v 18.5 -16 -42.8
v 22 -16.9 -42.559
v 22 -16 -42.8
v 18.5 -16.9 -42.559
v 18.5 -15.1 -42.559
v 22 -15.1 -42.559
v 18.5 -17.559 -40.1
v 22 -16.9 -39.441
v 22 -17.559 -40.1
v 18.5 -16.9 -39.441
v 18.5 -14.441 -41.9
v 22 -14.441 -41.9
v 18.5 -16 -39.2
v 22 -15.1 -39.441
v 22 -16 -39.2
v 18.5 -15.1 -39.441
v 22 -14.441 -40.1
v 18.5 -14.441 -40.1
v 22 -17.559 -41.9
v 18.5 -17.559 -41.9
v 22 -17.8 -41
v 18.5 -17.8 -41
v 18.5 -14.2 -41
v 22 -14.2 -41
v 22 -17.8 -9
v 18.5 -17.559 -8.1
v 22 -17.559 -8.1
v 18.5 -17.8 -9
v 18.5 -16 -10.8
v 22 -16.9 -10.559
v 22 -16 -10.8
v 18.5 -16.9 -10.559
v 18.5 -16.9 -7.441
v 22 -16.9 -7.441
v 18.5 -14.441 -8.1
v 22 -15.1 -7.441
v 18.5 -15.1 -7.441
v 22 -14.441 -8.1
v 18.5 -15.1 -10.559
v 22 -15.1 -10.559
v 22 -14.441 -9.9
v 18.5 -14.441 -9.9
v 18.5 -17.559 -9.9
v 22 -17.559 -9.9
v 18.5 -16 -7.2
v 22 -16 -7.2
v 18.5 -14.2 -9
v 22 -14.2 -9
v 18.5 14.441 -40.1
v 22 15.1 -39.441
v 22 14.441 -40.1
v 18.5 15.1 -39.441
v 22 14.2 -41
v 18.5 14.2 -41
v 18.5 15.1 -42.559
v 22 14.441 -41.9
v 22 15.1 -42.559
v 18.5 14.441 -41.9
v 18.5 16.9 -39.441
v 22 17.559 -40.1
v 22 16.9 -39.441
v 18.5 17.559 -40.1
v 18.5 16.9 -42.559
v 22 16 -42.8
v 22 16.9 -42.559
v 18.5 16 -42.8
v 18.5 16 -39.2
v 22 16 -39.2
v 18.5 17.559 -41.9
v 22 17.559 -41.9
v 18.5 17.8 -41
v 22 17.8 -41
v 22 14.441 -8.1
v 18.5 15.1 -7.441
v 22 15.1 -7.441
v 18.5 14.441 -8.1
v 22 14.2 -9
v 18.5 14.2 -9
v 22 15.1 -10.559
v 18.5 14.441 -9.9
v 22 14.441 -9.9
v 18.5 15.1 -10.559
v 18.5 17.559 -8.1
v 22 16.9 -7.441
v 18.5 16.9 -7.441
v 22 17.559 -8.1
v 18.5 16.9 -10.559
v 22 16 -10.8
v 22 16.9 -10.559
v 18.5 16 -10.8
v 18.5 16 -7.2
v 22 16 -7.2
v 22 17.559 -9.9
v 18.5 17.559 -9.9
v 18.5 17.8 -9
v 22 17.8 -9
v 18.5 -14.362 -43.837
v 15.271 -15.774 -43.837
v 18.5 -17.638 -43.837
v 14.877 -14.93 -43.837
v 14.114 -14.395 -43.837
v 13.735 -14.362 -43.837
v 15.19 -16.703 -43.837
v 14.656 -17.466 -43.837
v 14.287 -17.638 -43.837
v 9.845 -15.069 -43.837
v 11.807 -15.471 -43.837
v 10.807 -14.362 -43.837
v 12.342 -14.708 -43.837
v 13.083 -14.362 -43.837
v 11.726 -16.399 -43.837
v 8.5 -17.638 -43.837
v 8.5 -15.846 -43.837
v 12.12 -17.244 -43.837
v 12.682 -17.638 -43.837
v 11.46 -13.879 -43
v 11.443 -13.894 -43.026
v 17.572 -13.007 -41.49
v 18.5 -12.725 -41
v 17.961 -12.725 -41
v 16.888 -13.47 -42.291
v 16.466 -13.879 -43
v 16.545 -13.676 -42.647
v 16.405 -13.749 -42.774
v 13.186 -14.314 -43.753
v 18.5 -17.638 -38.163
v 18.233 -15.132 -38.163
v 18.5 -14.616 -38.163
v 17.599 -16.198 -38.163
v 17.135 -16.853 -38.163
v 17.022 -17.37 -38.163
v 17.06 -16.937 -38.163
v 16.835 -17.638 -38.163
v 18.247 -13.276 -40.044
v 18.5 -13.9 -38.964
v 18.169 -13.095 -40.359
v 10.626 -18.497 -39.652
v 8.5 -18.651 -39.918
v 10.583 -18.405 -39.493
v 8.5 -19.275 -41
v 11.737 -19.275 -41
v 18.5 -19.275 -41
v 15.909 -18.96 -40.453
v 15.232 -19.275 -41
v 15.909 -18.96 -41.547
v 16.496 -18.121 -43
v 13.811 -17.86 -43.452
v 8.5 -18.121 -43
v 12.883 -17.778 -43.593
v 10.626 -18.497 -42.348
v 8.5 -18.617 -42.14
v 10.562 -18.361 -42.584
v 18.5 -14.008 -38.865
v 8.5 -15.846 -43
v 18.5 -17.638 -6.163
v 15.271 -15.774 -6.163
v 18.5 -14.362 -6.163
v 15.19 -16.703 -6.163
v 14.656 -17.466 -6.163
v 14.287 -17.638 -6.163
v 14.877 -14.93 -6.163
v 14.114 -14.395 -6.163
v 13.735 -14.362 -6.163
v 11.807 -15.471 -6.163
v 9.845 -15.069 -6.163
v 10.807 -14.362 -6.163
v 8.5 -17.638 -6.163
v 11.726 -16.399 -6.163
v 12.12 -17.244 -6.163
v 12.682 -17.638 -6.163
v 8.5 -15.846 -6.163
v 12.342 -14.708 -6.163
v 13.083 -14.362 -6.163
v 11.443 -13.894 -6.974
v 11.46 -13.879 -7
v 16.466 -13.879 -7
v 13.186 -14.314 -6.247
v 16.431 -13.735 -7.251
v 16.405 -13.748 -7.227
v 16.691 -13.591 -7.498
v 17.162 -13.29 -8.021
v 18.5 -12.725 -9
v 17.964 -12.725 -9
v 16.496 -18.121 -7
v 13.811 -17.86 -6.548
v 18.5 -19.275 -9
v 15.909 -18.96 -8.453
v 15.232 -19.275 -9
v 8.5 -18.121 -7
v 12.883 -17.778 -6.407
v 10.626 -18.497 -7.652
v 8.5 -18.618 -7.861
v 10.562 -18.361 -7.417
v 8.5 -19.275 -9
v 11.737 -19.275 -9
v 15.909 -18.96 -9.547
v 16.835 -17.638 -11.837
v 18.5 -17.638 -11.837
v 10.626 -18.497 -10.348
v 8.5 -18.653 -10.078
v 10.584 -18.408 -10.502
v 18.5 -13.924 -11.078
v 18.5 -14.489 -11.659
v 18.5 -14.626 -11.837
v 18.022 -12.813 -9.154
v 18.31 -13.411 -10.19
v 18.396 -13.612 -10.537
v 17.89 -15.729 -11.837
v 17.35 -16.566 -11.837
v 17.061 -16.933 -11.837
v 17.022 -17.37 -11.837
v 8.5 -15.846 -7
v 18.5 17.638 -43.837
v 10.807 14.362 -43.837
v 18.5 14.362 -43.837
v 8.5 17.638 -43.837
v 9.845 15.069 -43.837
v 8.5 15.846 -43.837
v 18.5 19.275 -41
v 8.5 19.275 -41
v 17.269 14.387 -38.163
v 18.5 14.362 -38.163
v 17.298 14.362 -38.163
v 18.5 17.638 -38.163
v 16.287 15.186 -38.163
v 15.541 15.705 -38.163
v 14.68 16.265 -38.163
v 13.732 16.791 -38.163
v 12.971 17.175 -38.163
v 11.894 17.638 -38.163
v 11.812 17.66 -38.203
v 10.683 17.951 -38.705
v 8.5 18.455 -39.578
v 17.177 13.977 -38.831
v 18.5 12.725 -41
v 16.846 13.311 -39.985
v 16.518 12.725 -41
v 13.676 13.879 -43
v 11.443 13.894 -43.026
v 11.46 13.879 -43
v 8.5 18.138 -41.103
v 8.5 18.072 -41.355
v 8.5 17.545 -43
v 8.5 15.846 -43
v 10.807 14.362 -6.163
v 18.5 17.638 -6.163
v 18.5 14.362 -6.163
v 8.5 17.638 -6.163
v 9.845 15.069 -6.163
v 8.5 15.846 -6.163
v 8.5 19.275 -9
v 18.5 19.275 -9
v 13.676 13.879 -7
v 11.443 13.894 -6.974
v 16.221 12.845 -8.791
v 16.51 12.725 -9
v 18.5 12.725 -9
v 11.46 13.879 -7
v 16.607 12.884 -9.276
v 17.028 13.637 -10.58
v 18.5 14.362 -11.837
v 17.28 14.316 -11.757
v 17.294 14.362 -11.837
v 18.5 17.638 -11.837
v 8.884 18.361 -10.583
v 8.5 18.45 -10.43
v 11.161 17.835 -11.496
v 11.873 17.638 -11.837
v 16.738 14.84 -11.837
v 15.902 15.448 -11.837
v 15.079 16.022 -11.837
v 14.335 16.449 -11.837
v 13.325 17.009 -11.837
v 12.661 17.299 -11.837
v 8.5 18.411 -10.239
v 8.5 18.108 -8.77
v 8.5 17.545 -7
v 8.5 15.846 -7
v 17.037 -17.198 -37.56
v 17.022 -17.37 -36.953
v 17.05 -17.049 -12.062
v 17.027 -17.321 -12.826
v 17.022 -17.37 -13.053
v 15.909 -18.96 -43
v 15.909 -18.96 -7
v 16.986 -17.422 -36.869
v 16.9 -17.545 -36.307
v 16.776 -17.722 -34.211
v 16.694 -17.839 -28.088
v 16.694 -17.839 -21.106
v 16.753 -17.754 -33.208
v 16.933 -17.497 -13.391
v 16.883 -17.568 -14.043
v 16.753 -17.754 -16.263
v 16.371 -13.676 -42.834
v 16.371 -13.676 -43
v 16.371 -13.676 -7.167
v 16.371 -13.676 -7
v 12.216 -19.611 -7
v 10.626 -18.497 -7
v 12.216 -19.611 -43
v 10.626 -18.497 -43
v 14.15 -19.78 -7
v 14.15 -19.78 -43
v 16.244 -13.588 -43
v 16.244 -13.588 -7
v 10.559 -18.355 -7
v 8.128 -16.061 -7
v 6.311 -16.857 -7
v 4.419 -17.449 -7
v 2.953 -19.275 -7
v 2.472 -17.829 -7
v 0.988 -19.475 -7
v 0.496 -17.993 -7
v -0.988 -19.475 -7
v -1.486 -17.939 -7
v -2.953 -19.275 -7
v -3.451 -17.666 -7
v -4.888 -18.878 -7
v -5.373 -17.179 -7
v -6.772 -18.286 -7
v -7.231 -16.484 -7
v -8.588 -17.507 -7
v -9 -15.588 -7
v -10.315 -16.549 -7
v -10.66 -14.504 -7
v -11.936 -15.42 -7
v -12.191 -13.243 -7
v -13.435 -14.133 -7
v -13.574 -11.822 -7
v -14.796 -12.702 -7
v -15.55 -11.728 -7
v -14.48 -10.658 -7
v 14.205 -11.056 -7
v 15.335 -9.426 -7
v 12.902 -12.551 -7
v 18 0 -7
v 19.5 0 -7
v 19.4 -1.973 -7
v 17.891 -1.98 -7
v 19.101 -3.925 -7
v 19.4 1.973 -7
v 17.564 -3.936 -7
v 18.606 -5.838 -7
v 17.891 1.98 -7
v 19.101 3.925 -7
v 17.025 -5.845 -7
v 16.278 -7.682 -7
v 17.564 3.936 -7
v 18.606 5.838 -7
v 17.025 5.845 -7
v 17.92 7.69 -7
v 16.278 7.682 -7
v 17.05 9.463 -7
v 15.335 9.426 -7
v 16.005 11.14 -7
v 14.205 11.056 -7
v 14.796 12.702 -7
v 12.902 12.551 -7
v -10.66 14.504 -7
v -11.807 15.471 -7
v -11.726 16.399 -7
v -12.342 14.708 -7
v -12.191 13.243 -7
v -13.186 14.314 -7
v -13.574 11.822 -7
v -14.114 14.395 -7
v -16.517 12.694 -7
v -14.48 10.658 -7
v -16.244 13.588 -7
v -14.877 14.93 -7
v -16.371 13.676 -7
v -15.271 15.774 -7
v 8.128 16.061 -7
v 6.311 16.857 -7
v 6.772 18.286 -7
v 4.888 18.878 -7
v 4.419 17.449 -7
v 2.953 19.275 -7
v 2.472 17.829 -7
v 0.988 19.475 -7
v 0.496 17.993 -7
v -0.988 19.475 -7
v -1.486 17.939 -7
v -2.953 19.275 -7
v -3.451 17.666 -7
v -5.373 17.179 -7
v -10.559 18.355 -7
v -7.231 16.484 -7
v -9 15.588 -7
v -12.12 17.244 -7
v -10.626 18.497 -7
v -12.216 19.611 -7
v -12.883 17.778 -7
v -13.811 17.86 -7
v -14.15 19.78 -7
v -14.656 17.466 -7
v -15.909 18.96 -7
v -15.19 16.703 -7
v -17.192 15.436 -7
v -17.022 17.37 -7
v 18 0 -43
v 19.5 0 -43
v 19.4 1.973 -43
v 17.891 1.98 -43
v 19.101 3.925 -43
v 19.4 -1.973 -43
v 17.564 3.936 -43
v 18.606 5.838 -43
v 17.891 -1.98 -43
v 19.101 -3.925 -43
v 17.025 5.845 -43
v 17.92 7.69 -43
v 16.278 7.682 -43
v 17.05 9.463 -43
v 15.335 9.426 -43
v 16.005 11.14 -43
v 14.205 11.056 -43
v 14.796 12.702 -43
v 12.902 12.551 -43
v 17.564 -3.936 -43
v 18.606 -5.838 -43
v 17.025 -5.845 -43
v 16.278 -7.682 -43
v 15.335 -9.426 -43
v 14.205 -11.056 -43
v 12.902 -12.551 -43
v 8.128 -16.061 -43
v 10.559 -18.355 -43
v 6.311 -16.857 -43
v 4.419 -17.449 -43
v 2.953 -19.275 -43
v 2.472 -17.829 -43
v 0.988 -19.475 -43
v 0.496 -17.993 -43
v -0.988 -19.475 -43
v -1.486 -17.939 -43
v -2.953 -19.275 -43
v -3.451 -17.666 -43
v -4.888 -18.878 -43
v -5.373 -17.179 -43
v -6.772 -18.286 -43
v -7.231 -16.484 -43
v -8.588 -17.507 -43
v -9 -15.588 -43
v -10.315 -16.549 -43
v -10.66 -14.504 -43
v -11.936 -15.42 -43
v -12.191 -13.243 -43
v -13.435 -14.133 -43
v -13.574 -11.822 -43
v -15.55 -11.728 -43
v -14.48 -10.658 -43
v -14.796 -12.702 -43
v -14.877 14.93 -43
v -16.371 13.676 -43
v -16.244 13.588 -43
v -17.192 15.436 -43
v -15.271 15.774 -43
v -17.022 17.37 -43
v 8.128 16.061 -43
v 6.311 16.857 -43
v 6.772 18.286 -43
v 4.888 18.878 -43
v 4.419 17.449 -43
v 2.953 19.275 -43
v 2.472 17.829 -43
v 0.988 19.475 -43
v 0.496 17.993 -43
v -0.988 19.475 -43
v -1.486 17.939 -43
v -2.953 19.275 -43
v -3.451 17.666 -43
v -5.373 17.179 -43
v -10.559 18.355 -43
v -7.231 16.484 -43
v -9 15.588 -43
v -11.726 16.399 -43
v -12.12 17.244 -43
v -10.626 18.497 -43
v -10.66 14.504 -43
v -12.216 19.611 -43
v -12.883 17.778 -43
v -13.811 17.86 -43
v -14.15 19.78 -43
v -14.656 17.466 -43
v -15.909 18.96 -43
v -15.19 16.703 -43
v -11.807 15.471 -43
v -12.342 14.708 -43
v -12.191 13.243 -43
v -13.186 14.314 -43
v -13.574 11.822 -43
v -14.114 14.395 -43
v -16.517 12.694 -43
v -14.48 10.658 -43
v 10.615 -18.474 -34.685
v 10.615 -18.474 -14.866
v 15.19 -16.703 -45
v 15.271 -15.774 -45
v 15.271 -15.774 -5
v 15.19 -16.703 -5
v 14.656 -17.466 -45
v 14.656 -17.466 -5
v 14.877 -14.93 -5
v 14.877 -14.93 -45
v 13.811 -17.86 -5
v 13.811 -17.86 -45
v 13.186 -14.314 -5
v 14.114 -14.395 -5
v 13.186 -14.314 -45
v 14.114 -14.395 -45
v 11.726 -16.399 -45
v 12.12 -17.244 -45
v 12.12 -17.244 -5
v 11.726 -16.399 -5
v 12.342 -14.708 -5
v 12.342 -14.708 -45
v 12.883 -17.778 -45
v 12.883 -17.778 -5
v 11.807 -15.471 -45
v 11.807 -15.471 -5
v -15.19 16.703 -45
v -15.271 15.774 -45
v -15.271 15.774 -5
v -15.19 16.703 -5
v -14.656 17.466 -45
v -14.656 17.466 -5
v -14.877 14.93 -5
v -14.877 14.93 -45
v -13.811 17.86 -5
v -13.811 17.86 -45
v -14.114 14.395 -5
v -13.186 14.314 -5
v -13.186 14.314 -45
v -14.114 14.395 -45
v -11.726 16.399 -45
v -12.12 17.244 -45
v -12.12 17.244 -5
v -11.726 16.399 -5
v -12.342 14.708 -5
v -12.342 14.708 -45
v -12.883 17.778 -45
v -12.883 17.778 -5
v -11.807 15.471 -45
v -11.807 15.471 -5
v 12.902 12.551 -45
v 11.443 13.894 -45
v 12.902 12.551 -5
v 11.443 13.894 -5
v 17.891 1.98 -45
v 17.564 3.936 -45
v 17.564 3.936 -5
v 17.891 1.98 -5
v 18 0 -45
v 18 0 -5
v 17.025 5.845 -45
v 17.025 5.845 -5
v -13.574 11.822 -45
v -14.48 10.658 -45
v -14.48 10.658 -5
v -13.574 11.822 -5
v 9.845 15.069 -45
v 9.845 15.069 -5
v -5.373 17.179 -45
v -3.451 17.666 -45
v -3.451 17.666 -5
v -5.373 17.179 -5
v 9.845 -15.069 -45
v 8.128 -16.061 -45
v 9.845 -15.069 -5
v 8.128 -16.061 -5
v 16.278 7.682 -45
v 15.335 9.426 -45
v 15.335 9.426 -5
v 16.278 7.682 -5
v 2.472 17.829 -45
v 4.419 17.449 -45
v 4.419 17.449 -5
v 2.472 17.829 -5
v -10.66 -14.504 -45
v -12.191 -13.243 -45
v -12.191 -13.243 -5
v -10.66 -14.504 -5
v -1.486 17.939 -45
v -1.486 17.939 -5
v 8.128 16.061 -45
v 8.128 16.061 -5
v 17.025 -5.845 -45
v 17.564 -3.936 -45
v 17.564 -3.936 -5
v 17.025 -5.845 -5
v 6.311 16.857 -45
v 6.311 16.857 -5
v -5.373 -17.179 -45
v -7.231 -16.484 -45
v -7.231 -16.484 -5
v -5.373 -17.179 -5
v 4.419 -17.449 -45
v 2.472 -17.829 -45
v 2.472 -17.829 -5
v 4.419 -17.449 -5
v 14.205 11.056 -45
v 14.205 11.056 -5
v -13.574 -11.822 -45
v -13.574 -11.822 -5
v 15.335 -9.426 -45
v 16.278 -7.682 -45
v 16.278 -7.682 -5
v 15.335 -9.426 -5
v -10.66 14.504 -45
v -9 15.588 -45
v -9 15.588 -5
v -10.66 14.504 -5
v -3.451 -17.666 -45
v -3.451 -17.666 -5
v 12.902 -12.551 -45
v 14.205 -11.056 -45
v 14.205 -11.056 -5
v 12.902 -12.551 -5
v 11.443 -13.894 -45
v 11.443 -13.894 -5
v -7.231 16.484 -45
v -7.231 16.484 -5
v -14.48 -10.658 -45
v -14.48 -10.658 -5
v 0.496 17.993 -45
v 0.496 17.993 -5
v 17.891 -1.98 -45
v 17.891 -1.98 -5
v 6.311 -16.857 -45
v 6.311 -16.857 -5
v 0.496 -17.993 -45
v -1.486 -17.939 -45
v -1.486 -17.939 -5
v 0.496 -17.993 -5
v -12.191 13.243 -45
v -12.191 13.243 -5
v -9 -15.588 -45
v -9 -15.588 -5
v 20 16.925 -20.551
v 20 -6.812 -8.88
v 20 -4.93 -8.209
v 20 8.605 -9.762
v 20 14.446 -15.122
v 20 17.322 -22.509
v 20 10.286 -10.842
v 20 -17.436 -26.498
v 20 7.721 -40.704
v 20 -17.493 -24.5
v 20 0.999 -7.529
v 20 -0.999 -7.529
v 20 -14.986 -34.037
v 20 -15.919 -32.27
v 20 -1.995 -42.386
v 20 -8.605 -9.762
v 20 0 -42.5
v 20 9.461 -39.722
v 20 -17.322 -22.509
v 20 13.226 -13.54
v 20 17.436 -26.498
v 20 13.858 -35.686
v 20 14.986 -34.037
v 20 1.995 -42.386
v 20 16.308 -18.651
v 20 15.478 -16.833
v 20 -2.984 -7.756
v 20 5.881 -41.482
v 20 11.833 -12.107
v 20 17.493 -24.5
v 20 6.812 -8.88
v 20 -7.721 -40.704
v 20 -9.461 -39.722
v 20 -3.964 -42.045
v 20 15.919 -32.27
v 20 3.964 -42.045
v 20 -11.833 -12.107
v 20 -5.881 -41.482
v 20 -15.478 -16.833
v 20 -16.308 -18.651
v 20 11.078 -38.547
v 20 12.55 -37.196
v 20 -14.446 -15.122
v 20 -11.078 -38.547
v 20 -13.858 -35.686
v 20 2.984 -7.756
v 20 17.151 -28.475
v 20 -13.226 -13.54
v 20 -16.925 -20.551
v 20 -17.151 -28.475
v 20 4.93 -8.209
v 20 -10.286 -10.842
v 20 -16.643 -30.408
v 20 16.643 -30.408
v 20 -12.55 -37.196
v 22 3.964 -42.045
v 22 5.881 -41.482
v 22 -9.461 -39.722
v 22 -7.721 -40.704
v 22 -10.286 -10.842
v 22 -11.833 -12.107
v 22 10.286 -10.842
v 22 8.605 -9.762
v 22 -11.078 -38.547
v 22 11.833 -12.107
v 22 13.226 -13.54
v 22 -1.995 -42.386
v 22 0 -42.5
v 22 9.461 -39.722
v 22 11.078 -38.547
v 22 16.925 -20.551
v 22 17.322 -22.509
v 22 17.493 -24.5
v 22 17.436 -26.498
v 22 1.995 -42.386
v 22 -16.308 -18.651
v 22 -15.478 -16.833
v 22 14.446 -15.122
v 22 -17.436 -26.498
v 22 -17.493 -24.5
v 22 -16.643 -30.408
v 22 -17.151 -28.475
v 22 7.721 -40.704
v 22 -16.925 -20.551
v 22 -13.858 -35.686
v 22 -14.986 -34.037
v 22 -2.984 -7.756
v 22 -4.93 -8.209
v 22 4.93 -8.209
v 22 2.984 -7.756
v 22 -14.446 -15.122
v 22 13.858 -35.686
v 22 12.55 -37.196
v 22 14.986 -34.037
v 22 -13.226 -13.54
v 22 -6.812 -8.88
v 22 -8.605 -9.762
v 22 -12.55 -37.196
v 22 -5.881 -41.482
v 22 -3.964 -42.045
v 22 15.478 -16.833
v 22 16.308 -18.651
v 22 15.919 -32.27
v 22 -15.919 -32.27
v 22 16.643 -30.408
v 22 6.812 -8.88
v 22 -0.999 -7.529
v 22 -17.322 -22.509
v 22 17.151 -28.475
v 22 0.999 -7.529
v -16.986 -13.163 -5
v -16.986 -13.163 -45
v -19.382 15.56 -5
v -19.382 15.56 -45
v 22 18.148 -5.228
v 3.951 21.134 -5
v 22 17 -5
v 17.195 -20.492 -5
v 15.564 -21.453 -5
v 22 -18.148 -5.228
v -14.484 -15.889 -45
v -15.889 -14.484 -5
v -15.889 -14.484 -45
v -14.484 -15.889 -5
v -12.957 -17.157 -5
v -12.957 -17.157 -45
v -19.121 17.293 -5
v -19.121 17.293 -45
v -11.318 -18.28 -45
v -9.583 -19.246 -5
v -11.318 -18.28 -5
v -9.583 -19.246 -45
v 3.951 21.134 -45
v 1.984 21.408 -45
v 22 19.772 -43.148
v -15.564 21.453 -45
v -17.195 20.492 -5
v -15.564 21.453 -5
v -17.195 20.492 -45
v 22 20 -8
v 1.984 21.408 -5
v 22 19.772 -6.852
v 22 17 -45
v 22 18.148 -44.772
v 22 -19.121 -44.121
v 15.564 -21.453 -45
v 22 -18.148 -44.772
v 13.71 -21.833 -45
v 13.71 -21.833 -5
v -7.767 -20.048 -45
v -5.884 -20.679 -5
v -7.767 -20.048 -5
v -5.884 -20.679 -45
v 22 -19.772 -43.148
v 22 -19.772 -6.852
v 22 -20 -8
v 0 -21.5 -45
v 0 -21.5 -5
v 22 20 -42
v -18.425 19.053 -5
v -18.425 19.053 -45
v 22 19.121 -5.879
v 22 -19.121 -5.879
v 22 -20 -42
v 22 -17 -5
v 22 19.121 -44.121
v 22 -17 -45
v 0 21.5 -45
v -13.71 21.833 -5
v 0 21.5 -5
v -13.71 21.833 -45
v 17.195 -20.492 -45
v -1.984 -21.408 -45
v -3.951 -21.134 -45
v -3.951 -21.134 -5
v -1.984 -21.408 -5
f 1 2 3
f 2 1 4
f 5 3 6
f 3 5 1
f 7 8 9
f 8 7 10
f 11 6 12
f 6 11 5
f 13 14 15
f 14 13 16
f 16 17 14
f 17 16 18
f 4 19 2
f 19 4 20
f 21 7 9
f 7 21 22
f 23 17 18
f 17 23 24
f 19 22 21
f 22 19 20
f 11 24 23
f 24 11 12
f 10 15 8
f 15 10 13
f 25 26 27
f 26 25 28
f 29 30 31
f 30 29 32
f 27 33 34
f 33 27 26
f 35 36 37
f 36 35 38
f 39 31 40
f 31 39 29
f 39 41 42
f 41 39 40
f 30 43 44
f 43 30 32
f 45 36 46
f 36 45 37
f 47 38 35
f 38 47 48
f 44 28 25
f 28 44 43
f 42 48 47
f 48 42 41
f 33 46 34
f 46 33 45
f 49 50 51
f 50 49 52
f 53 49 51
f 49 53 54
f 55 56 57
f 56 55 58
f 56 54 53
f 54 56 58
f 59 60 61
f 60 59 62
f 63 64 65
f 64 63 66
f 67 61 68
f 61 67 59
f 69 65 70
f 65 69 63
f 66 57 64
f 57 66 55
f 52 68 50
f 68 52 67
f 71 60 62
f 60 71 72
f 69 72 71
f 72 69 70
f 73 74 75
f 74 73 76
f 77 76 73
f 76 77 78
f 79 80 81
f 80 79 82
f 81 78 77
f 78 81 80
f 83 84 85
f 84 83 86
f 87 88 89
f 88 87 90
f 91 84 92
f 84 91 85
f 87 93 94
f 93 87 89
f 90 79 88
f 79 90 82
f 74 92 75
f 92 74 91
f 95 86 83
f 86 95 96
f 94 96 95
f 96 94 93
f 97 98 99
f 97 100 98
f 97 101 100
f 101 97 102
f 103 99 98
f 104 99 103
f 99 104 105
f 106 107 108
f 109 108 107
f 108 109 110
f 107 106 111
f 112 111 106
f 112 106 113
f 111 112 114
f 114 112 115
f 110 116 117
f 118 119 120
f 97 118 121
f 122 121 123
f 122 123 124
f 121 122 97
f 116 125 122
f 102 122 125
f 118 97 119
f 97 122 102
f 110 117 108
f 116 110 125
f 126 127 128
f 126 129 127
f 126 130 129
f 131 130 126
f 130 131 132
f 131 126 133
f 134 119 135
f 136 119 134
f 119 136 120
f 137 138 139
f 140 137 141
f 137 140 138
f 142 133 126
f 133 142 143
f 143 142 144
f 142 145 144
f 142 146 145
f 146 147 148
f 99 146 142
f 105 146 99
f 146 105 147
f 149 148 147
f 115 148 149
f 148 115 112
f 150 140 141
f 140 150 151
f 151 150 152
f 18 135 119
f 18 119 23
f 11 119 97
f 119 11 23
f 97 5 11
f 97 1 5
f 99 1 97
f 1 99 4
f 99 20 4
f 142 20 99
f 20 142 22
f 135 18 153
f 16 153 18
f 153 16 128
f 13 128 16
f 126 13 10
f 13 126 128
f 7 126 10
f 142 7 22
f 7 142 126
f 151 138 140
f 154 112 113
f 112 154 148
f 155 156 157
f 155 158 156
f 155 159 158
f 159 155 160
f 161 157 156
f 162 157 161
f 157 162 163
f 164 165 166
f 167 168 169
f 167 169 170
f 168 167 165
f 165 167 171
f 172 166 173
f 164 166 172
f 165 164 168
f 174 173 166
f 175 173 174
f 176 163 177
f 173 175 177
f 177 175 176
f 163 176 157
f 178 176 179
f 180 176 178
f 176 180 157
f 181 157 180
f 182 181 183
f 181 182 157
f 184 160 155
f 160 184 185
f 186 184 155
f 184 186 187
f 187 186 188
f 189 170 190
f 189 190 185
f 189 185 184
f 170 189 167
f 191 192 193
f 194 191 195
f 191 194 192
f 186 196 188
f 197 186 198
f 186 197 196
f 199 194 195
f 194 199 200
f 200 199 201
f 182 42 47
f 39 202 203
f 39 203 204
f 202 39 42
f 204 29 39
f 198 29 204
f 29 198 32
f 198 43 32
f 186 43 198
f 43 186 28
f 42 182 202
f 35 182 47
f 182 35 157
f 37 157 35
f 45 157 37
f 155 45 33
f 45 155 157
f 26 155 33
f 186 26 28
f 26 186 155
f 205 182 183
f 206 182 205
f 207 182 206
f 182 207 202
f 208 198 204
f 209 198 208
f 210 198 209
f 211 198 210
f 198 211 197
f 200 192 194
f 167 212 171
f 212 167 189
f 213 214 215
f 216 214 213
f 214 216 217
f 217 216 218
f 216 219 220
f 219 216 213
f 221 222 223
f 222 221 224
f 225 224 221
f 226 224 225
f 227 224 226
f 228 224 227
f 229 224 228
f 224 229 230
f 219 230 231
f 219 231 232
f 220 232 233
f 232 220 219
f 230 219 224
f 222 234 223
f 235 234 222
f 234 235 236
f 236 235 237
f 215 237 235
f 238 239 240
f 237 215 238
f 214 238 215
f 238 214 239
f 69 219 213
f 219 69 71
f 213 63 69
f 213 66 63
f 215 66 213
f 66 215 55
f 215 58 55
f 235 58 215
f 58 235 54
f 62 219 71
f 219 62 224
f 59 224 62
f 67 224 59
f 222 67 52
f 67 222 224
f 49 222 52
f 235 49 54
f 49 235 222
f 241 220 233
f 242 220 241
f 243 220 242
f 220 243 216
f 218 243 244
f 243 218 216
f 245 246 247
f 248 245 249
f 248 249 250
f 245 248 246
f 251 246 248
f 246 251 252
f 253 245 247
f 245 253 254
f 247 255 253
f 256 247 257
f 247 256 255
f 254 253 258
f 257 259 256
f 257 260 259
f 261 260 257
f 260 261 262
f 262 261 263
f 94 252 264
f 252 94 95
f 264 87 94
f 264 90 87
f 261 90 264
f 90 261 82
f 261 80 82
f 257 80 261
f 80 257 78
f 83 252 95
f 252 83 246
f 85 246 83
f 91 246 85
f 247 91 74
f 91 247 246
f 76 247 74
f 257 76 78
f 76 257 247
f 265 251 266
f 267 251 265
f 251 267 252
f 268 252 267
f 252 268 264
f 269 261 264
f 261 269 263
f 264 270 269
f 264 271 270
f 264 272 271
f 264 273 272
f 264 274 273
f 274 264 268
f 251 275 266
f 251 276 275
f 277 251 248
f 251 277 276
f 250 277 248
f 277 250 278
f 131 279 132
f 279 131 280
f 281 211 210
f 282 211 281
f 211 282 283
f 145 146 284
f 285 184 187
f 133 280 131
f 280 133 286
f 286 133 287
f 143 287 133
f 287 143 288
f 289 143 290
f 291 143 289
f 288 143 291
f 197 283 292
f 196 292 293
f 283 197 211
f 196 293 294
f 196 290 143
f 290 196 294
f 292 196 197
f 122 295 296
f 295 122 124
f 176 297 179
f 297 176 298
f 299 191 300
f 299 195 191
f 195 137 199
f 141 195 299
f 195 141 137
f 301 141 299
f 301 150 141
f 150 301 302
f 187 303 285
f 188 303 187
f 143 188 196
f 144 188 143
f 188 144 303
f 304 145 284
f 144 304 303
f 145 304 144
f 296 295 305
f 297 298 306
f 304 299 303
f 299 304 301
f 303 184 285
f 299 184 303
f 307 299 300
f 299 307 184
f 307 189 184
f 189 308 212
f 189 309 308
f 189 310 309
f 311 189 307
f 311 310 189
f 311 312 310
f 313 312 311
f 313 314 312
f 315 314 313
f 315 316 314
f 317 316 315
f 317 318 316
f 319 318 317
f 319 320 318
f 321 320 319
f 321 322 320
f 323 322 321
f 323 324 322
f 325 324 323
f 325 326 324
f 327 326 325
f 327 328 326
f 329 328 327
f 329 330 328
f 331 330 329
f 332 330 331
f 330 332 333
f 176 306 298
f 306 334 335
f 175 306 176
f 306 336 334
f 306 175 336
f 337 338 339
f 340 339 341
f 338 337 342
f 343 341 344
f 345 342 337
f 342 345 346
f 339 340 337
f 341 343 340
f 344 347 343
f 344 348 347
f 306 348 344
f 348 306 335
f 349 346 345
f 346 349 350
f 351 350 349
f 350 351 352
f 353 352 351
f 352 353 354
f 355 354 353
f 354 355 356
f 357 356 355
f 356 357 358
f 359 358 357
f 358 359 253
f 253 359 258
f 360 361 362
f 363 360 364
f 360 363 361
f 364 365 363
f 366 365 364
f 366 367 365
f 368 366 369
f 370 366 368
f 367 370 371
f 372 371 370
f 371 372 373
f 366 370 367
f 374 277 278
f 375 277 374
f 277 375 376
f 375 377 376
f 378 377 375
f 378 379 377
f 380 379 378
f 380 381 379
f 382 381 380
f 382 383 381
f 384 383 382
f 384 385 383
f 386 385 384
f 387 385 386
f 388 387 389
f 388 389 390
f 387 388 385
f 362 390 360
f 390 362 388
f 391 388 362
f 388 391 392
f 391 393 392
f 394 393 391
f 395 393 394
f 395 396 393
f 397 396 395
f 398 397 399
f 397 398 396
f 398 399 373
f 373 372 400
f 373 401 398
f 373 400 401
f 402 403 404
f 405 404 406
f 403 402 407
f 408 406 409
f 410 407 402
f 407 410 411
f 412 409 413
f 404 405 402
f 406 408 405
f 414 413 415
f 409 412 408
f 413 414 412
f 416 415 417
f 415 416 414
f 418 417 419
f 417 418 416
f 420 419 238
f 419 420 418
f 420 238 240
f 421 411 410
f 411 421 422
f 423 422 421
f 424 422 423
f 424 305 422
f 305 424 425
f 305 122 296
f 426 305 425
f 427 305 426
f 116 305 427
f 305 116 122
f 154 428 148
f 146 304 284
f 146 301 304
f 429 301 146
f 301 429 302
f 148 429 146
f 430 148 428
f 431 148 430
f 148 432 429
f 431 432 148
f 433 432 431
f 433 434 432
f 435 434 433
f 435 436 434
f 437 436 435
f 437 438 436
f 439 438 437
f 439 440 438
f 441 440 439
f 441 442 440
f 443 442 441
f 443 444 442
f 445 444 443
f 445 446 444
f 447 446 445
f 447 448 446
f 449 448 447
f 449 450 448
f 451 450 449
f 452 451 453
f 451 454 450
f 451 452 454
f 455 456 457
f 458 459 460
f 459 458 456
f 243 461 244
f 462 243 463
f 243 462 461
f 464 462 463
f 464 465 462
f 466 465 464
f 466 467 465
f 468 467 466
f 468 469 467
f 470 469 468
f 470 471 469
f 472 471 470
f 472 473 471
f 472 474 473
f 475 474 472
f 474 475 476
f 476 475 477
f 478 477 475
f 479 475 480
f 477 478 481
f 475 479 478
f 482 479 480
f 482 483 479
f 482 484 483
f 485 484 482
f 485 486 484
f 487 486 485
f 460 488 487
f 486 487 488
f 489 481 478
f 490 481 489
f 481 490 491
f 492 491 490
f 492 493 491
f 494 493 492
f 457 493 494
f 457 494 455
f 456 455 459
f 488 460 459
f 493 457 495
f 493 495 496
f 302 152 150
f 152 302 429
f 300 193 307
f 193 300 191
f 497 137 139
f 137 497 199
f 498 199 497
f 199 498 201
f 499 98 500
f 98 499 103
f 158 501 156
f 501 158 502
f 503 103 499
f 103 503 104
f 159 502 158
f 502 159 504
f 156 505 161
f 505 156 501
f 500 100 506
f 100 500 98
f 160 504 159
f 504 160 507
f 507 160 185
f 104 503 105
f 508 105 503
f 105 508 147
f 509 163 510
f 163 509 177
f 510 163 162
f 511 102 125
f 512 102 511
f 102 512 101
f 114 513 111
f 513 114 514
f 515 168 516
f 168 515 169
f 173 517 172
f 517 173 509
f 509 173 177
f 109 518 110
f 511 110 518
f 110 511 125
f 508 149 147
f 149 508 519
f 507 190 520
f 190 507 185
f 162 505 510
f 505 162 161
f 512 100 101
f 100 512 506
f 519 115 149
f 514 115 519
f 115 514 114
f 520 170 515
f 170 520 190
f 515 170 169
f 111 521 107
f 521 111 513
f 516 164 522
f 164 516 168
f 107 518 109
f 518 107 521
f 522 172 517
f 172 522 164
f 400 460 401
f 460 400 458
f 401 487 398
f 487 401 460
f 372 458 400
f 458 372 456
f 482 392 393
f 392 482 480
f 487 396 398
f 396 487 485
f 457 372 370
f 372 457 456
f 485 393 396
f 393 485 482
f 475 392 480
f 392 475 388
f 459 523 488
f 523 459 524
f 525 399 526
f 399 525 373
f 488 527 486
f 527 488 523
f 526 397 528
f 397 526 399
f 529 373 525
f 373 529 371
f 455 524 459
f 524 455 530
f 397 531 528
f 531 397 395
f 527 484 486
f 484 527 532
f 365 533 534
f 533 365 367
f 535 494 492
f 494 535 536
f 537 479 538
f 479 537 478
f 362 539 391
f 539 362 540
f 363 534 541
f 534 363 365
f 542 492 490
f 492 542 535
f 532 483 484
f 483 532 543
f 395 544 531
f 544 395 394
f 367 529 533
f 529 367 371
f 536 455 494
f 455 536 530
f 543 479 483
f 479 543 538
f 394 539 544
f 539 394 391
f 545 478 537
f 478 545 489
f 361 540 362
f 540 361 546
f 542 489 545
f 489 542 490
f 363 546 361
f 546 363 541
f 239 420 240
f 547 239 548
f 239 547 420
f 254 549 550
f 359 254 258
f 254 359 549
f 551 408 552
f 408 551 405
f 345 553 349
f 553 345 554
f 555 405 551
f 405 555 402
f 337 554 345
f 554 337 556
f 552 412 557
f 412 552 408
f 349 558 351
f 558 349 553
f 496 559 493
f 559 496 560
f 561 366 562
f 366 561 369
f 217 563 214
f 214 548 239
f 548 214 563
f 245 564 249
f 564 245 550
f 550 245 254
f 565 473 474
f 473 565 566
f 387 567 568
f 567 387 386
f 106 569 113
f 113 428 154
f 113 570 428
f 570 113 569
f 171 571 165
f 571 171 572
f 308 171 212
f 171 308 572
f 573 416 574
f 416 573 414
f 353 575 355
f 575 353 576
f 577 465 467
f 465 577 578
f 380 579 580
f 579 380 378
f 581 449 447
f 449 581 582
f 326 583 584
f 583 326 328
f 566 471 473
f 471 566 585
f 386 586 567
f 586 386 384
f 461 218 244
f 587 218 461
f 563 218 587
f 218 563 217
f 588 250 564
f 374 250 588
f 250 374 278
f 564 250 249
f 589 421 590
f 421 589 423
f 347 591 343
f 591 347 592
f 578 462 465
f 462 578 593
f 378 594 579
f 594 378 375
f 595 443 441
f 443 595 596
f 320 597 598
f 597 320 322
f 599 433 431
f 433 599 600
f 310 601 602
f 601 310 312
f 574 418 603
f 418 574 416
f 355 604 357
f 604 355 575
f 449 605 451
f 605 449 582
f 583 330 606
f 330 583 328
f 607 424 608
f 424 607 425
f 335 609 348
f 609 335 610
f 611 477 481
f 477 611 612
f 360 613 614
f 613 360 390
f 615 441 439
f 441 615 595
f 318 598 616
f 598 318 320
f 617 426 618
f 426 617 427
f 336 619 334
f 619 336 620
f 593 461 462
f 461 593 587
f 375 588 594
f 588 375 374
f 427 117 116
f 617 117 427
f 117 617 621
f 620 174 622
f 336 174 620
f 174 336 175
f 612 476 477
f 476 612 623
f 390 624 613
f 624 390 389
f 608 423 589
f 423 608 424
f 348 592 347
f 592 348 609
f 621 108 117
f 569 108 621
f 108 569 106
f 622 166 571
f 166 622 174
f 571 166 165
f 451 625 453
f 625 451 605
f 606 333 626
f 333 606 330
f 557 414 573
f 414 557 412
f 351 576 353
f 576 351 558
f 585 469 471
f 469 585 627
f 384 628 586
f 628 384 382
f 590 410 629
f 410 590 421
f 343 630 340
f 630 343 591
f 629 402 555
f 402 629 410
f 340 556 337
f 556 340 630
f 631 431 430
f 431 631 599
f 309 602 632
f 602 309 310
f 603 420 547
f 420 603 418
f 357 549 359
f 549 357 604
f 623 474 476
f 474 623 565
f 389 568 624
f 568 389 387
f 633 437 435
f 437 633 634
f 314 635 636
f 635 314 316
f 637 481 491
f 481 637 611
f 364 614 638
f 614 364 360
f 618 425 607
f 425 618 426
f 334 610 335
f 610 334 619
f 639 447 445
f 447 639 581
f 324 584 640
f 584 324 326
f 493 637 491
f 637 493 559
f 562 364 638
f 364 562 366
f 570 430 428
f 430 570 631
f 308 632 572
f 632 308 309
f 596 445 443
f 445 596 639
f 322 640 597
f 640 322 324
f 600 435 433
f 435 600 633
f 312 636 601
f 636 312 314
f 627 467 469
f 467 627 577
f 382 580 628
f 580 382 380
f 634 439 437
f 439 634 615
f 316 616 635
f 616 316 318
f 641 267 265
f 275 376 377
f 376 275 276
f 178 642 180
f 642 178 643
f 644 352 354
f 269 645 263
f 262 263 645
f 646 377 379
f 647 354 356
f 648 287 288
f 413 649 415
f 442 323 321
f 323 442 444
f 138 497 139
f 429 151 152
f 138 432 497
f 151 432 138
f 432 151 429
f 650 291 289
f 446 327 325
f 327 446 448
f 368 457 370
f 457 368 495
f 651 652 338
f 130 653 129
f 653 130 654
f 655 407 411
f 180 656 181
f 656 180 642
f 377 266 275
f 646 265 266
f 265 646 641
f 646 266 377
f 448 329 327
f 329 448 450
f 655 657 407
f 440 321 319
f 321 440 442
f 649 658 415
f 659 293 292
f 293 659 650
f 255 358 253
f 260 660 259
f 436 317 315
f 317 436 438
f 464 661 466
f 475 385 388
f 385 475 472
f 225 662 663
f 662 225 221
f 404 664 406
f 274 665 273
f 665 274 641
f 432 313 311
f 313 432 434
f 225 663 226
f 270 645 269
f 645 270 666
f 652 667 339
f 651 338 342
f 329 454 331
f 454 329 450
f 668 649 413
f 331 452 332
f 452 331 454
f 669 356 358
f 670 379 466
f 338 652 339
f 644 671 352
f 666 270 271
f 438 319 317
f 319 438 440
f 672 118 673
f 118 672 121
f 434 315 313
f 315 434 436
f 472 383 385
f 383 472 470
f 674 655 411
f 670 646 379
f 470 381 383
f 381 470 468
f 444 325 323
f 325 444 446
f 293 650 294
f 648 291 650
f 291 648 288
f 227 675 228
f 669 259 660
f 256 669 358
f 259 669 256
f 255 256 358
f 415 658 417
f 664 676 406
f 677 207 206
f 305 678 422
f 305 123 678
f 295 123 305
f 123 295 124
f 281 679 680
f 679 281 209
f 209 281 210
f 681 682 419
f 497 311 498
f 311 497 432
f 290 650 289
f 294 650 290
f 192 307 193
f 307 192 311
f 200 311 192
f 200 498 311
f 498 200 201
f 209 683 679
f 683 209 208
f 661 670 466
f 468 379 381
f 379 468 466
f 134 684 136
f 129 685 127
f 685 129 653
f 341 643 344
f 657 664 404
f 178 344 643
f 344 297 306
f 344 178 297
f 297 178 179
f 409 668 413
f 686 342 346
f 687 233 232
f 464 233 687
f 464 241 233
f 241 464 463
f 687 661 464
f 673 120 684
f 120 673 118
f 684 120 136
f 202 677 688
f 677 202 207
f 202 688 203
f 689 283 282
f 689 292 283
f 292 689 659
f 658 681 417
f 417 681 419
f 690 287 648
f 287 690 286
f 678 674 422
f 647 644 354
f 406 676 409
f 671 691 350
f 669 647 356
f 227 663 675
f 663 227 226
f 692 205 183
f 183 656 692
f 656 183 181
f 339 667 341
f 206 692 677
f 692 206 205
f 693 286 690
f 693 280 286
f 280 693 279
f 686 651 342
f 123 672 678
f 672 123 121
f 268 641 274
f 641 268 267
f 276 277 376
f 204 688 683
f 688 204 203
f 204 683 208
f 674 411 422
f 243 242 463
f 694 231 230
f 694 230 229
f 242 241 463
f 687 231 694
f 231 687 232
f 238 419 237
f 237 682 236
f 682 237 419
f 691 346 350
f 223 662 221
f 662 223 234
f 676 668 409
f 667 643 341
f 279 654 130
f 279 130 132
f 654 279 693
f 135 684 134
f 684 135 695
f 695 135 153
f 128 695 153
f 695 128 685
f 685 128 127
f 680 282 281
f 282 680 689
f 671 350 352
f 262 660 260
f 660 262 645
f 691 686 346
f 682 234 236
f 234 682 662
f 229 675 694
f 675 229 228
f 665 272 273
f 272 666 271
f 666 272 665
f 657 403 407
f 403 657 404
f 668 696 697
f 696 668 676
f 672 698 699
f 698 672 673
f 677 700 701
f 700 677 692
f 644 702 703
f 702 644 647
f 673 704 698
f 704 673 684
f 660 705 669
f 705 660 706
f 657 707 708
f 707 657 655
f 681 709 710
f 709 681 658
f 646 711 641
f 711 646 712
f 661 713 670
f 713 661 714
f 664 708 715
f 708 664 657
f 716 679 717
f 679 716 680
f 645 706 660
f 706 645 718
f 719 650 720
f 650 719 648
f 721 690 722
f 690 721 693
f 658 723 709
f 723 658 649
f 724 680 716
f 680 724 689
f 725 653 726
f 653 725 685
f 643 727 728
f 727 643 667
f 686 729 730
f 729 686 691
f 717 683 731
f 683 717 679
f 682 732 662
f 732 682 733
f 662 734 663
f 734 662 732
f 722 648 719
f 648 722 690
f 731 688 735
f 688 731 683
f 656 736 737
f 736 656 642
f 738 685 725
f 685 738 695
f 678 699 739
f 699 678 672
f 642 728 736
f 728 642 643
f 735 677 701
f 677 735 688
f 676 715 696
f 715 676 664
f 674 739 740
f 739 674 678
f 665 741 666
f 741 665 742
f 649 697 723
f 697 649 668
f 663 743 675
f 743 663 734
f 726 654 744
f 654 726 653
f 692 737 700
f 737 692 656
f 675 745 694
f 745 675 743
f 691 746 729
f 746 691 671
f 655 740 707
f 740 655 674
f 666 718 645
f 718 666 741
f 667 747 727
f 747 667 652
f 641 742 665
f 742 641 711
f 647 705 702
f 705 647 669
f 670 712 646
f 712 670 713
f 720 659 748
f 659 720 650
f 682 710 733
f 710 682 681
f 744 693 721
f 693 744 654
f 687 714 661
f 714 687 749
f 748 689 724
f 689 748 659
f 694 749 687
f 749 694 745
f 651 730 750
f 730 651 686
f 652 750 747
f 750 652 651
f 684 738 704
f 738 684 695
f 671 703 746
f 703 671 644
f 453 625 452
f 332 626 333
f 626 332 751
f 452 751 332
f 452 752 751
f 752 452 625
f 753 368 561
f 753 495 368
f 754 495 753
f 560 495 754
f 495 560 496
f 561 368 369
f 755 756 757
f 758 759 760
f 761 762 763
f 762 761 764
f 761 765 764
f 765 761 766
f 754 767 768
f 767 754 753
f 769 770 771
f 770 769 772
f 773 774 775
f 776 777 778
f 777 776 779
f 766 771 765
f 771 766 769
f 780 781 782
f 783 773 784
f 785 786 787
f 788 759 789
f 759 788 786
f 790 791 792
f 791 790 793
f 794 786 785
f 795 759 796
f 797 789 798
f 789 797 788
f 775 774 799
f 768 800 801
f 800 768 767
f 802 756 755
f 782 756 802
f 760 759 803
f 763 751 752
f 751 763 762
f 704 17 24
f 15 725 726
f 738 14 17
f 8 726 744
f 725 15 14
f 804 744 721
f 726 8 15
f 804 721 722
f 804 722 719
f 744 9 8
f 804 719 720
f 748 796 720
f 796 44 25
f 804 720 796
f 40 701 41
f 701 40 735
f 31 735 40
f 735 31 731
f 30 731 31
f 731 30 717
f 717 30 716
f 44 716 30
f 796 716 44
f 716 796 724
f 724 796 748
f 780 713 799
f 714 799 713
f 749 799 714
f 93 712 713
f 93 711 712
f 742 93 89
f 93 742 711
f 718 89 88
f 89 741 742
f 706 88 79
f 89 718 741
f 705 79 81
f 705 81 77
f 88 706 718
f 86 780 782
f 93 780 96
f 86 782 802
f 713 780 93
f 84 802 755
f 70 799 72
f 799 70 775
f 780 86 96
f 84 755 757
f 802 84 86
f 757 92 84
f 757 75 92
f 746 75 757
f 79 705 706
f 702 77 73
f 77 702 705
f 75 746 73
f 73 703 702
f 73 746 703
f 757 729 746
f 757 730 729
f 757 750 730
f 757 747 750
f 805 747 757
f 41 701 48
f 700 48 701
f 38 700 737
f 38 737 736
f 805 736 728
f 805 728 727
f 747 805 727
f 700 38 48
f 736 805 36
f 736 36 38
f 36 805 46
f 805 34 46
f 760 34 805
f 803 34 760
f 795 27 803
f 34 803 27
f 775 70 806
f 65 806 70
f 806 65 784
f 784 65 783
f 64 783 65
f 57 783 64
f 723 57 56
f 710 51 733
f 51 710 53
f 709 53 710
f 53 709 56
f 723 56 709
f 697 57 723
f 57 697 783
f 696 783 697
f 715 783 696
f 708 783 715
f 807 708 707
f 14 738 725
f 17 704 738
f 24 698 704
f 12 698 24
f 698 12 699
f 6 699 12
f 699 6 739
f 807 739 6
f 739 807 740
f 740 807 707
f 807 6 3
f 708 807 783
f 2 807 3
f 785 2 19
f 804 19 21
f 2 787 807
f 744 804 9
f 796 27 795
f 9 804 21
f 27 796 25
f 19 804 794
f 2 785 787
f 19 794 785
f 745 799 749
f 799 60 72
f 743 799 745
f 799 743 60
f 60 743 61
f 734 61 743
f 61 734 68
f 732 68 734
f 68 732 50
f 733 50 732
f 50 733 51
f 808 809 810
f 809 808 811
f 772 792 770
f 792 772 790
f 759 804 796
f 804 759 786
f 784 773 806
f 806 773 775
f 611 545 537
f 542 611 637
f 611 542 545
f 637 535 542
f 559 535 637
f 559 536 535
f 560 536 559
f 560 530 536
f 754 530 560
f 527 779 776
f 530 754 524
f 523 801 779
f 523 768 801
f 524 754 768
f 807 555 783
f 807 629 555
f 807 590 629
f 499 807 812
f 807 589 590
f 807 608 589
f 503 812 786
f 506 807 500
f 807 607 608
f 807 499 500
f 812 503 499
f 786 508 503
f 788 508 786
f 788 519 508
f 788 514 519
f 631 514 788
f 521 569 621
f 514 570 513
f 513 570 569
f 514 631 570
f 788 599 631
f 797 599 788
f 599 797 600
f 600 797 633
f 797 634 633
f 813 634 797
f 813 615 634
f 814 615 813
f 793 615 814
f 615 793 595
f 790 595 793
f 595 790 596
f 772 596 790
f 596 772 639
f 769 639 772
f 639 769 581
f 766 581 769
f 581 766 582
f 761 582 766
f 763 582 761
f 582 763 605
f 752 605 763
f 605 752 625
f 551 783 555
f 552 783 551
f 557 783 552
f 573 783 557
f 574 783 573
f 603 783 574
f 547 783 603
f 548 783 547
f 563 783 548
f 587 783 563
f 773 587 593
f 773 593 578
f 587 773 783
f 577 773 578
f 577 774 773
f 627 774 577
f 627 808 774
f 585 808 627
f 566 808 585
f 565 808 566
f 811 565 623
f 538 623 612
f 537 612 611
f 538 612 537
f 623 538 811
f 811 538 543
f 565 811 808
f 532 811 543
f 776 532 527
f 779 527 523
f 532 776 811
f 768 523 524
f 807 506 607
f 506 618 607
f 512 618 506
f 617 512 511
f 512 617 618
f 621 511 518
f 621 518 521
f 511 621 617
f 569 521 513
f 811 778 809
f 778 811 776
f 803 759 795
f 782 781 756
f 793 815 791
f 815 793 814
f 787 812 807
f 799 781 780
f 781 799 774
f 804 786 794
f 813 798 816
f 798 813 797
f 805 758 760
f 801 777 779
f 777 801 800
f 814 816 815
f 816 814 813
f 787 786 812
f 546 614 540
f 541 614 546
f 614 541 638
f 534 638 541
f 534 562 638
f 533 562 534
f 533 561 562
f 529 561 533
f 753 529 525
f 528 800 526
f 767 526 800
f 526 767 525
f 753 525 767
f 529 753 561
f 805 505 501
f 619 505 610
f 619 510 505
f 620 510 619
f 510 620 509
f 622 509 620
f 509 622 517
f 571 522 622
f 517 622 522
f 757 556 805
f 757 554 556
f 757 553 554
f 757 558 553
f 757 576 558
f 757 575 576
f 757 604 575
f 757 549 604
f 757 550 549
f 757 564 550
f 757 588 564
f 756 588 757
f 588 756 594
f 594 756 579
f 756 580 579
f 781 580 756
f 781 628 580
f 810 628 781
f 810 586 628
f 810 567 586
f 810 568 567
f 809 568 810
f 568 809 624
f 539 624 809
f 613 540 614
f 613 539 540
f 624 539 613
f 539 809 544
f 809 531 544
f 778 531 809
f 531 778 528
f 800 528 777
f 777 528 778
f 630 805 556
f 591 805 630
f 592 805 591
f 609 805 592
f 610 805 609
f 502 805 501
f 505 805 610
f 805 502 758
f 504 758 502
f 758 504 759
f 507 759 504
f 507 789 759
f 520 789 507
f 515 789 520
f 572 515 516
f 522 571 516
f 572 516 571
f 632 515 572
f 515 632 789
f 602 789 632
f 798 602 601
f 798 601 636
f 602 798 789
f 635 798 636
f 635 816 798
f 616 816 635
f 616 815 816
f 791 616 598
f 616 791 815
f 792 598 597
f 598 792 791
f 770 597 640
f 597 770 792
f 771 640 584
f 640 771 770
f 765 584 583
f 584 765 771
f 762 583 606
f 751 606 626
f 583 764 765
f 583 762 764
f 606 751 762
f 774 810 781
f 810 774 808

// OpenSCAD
// file: configuration.scad
//
// RepRap Mendel Akimbo
//
// A Mendel variant, which improves the frame's clearance and stability
//  by increasing it's triangulation.
//
// Copyright 2012 by Ron Aldrich.
//
// Licensed under GNU GPL v2
//
//	configuration.scad
//
//	General configuration settings.
//
//	Because this file is intended to be somewhat interchangable with 
//		configuration.scad from prusajr's github repository, there is 
//		more configuration in "moreConfiguration.scad".
//
//  Only the metric variant is tested. Other variants are not supported, and will most likely
//    create unworkable parts.
//
//	Edit layer_height to be greater than the height of one printed layer, 
//		but less than the height of two printed layers.
//


metric = 0;	// All parts are metric - use both M3 and M4 bolts.
sae = 1;		// All parts are SAE - use only #6/32 bolts.
m3only = 2;	// All parts are metric, but use only M3 bolts.
hybrid = 3;	// Mix of metric and SAE - use M3 and 6/32 bolts.

variant = metric;

layer_height = .25;

nut_slop = .2;		// I aim for a "interference fit" for nuts - a bit of force required to place the nut.

bolt_slop = .6;	// The aim here is to just barely allow the bolt to fit through the hole, without having to thread it in.

_actual_m3_diameter = 3+bolt_slop;
_actual_m4_diameter = 4+bolt_slop;
_actual_6_32_diameter = 3.4+bolt_slop;

_actual_m3_nut_diameter = 5.5/cos(30)+nut_slop;
_actual_m4_nut_diameter = 6.87/cos(30)+nut_slop;
_actual_m5_nut_diameter = 7.85/cos(30)+nut_slop;
_actual_6_32_nut_diameter = 7.85/cos(30)+nut_slop;

_m3_diameters = [_actual_m3_diameter, _actual_6_32_diameter, _actual_m3_diameter, _actual_m3_diameter];
_m3_nut_diameters = [_actual_m3_nut_diameter, _actual_6_32_nut_diameter, _actual_m3_nut_diameter, _actual_m3_nut_diameter];

_m4_diameters = [_actual_m4_diameter, _actual_6_32_diameter, _actual_m3_diameter, _actual_6_32_diameter];
_m4_nut_diameters = [_actual_m4_nut_diameter, _actual_6_32_nut_diameter, _actual_m3_nut_diameter, _actual_6_32_nut_diameter];

m3_diameter = _m3_diameters[variant];
m3_nut_diameter = _m3_nut_diameters[variant];

m4_diameter = _m4_diameters[variant];
m4_nut_diameter = _m4_nut_diameters[variant];

m5_diameter = 5+bolt_slop;
m5_nut_diameter = 7.85/cos(30)+nut_slop;
m5_bolt_head_height = 4;

m6_diameter = 6+bolt_slop;
m6_nut_diameter = 10/cos(30)+nut_slop;
m6_bolt_head_height = 4;

m8_diameter = 8;

m8_nut_diameter = 12.8/cos(30)+nut_slop;
m8_nut_thickness = 7.7;
m8_bolt_head_height = 6;
m8_half_nut_height = 3.85;

threaded_rod_diameter = 8.7;

actual_smooth_rod_diameter = 8;
smooth_rod_diameter = actual_smooth_rod_diameter+.25;
// file: more_configuration.scad
//
// RepRap Mendel Akimbo
//
// A Mendel variant, which improves the frame's clearance and stability
//  by increasing it's triangulation.
//
// Copyright 2012 by Ron Aldrich.
//
// Licensed under GNU GPL v2
//
// moreConfiguration.scad
//
//	General configuration settings that didn't exist in prusajr's configuration.scad
//
//	These settings are here, rather than in configuration.scad, in
//		order to keep configuration.scad interchangable with prusajr.s version.
//
// Edit extrusion_width to be greater than the width of one shell, but less than the width of two shells.

include <configuration.scad>

extrusion_width = .6;

vertical_slop = .6;
horizontal_slop = .3;

_actual_m3_nut_thickness = 2.5;
_actual_m4_nut_thickness = 3.5;
_actual_6_32_nut_thickness = 3.25;

_m3_nut_thickness = [_actual_m3_nut_thickness, _actual_6_32_nut_thickness, _actual_m3_nut_thickness, _actual_m3_nut_thickness];

_m4_nut_thickness = [_actual_m4_nut_thickness, _actual_6_32_nut_thickness, _actual_m3_nut_thickness, _actual_6_32_nut_thickness];

m3_nut_thickness = _m3_nut_thickness[variant];
m3_washer_diameter = 7.5;

m4_nut_thickness = _m4_nut_thickness[variant];

m3_bolt_head_height = 3;
m3_bolt_head_diameter = 6+horizontal_slop;

m4_bolt_head_height = 4;
m4_bolt_head_diameter = 7+horizontal_slop;

// Don't edit things after here.

x = 0;
y = 1;
z = 2;

bearing_length = 0;
bearing_body_diameter = 1;
bearing_flange_diameter = 2;
bearing_flange_width = 3;
bearing_rod_diameter = 4;

// linear_roller_bearing = [2, 6, 6, 0, 3];

683_bearing = [3, 7, 7, 0, 3];
683_bearing_clearance = [0.4, 0.4, 0.4, 0, 2];

623_bearing = [4, 10, 10, 0, 6];
623_bearing_clearance = [0.4, 0.4, 0.4, 0, 2];

624_bearing = [5, 13, 13, 0, 4];
624_bearing_clearance = [0.4, 0.4, 0.4, 0, 2];

608_bearing = [7, 22, 22, 0, 8];
608_bearing_clearance = [0.4, 0.4, 0.4, 0, 2];

115_bearing = [4, 11, 11, 0, 5];
115_bearing_clearance = [0.4, 0.4, 0.4, 0, 3];

106_bearing = [3, 10, 10, 0, 6];
106_bearing_clearance = [0.4, 0.4, 0.4, 0, 0];

126_bearing = [4, 12, 12, 0, 6];
126_bearing_clearance = [0.4, 0.4, 0.4, 0, 3];

128_bearing = [3.5, 12, 12, 0, 8];
128_bearing_clearance = [0.4, 0.4, 0.4, 4];

lm8uu = [24, 15, 15, 0, 8];
lm8uu_clearance = [0.7, 0.7, 0.7, 0, 0];

igus = [10, 10, 15, 1, 8];
igus_clearance = [0.4, 0.4, 0.4, 0.4, 0];

part_color_1 = [1, .9, 0];
part_color_2 = [.9, 1, 0];

wood_color_1 = [111/256, 78/256, 55/256];
wood_color_2 = wood_color_1+[.2, .2, .2];
wood_color_3 = wood_color_1-[.2, .2, .2];

nema17_hole_spacing = 1.25*25.4;

ramps_size = [102, 60];

ramps_mounts = [[-35.76, -20.86],
                [-35.76, 27.4],
                [39.17, 27.4],
                [45.52, -20.86]];

//echo(ramps_mounts);
// main file
//
// RepRap Mendel Akimbo
//
// A Mendel variant, which improves the frame's clearance and stability
//  by increasing it's triangulation.
//
// Copyright 2012 by Ron Aldrich.
//
// Licensed under GNU GPL v2
//
// extruder_fan_shroud.scad
//

include <more_configuration.scad>

$fa=1;
$fs=2;

motor_angle = 310;

mount_thickness = 5;
motor_length = 45;
motor_radius = 35/2;
motor_bolt_offset = 42/2;		// offset from center of motor to bolt hole.

*rotate([0, 0, motor_angle])
%minebea_motor();

extruder_fan_shroud();

module extruder_fan_shroud()
{
	difference()
	{
		extruder_fan_shroud_solid();
		extruder_fan_shroud_void();
	}
}

module extruder_fan_shroud_solid()
{
	hull()
	{
		translate([21, 0, -40/2-5])
		for(i=[-1, 1]) for(j=[-1, 1])
			translate([0, i*(20-3), j*(20-3)])
			rotate([0, 90, 0])
			cylinder(h=2, r=3, $fn=16, center=true);

		translate([0, 0, -40/2-5])
		cylinder(h=40, r=motor_radius+4, center=true);

		for(i=[0:1])
			rotate([0, 0, motor_angle+i*180])
			translate([motor_bolt_offset, 0, -40/2-5])
			cylinder(h=40, r=m3_washer_diameter/2+2, center=true);
	}
}

module extruder_fan_shroud_void()
{
	translate([0, 0, -motor_length/2])
	cylinder(h=motor_length+.1, r=motor_radius+.5, center=true);

	hull()
	{
		translate([0, 0, -40/2-5])
		cylinder(h=40-4, r=motor_radius+2, center=true);

		translate([19, 0, -40/2-5])
		rotate([0, 90, 0])
		cylinder(h=2, r=35/2, center=true);

		for(i=[0:1])
			rotate([0, 0, motor_angle+i*180])
			translate([motor_bolt_offset, 0, -40/2-5])
			cylinder(h=40-4, r=2, center=true);

	}

	translate([21, 0, -40/2-5])
	rotate([0, 90, 0])
	cylinder(h=2.1, r=35/2, center=true);

	translate([22-5, 0, -40/2-5])
	for(i=[-1, 1]) for(j=[-1, 1])
		translate([0, i*(20-4), j*(20-4)])
		rotate([0, 90, 0])
		cylinder(h=10.1, r=m3_diameter/2, $fn=12, center=true);

	translate([22-5-3.5, 0, -40/2-5])
	for(i=[-1, 1]) for(j=[-1, 1])
		translate([0, i*(20-4), j*(20-4)])
		rotate([0, 90, 0])
		rotate([0, 0, 90])
		cylinder(h=10, r=m3_nut_diameter/2, $fn=6, center=true);


	for(i=[0:1])
		rotate([0, 0, motor_angle+i*180])
		translate([motor_bolt_offset, 0, -40/2-5])
		{
			cylinder(h=40-4, r=m3_washer_diameter/2, center=true);
			cylinder(h=40.1, r=m3_diameter/2, $fn=12, center=true);
		}

	translate([-(35/2)-4, 0, -40/2-5])
	rotate([0, 0, 45])
	cube([25, 25, 40.1], center=true);

}

	
